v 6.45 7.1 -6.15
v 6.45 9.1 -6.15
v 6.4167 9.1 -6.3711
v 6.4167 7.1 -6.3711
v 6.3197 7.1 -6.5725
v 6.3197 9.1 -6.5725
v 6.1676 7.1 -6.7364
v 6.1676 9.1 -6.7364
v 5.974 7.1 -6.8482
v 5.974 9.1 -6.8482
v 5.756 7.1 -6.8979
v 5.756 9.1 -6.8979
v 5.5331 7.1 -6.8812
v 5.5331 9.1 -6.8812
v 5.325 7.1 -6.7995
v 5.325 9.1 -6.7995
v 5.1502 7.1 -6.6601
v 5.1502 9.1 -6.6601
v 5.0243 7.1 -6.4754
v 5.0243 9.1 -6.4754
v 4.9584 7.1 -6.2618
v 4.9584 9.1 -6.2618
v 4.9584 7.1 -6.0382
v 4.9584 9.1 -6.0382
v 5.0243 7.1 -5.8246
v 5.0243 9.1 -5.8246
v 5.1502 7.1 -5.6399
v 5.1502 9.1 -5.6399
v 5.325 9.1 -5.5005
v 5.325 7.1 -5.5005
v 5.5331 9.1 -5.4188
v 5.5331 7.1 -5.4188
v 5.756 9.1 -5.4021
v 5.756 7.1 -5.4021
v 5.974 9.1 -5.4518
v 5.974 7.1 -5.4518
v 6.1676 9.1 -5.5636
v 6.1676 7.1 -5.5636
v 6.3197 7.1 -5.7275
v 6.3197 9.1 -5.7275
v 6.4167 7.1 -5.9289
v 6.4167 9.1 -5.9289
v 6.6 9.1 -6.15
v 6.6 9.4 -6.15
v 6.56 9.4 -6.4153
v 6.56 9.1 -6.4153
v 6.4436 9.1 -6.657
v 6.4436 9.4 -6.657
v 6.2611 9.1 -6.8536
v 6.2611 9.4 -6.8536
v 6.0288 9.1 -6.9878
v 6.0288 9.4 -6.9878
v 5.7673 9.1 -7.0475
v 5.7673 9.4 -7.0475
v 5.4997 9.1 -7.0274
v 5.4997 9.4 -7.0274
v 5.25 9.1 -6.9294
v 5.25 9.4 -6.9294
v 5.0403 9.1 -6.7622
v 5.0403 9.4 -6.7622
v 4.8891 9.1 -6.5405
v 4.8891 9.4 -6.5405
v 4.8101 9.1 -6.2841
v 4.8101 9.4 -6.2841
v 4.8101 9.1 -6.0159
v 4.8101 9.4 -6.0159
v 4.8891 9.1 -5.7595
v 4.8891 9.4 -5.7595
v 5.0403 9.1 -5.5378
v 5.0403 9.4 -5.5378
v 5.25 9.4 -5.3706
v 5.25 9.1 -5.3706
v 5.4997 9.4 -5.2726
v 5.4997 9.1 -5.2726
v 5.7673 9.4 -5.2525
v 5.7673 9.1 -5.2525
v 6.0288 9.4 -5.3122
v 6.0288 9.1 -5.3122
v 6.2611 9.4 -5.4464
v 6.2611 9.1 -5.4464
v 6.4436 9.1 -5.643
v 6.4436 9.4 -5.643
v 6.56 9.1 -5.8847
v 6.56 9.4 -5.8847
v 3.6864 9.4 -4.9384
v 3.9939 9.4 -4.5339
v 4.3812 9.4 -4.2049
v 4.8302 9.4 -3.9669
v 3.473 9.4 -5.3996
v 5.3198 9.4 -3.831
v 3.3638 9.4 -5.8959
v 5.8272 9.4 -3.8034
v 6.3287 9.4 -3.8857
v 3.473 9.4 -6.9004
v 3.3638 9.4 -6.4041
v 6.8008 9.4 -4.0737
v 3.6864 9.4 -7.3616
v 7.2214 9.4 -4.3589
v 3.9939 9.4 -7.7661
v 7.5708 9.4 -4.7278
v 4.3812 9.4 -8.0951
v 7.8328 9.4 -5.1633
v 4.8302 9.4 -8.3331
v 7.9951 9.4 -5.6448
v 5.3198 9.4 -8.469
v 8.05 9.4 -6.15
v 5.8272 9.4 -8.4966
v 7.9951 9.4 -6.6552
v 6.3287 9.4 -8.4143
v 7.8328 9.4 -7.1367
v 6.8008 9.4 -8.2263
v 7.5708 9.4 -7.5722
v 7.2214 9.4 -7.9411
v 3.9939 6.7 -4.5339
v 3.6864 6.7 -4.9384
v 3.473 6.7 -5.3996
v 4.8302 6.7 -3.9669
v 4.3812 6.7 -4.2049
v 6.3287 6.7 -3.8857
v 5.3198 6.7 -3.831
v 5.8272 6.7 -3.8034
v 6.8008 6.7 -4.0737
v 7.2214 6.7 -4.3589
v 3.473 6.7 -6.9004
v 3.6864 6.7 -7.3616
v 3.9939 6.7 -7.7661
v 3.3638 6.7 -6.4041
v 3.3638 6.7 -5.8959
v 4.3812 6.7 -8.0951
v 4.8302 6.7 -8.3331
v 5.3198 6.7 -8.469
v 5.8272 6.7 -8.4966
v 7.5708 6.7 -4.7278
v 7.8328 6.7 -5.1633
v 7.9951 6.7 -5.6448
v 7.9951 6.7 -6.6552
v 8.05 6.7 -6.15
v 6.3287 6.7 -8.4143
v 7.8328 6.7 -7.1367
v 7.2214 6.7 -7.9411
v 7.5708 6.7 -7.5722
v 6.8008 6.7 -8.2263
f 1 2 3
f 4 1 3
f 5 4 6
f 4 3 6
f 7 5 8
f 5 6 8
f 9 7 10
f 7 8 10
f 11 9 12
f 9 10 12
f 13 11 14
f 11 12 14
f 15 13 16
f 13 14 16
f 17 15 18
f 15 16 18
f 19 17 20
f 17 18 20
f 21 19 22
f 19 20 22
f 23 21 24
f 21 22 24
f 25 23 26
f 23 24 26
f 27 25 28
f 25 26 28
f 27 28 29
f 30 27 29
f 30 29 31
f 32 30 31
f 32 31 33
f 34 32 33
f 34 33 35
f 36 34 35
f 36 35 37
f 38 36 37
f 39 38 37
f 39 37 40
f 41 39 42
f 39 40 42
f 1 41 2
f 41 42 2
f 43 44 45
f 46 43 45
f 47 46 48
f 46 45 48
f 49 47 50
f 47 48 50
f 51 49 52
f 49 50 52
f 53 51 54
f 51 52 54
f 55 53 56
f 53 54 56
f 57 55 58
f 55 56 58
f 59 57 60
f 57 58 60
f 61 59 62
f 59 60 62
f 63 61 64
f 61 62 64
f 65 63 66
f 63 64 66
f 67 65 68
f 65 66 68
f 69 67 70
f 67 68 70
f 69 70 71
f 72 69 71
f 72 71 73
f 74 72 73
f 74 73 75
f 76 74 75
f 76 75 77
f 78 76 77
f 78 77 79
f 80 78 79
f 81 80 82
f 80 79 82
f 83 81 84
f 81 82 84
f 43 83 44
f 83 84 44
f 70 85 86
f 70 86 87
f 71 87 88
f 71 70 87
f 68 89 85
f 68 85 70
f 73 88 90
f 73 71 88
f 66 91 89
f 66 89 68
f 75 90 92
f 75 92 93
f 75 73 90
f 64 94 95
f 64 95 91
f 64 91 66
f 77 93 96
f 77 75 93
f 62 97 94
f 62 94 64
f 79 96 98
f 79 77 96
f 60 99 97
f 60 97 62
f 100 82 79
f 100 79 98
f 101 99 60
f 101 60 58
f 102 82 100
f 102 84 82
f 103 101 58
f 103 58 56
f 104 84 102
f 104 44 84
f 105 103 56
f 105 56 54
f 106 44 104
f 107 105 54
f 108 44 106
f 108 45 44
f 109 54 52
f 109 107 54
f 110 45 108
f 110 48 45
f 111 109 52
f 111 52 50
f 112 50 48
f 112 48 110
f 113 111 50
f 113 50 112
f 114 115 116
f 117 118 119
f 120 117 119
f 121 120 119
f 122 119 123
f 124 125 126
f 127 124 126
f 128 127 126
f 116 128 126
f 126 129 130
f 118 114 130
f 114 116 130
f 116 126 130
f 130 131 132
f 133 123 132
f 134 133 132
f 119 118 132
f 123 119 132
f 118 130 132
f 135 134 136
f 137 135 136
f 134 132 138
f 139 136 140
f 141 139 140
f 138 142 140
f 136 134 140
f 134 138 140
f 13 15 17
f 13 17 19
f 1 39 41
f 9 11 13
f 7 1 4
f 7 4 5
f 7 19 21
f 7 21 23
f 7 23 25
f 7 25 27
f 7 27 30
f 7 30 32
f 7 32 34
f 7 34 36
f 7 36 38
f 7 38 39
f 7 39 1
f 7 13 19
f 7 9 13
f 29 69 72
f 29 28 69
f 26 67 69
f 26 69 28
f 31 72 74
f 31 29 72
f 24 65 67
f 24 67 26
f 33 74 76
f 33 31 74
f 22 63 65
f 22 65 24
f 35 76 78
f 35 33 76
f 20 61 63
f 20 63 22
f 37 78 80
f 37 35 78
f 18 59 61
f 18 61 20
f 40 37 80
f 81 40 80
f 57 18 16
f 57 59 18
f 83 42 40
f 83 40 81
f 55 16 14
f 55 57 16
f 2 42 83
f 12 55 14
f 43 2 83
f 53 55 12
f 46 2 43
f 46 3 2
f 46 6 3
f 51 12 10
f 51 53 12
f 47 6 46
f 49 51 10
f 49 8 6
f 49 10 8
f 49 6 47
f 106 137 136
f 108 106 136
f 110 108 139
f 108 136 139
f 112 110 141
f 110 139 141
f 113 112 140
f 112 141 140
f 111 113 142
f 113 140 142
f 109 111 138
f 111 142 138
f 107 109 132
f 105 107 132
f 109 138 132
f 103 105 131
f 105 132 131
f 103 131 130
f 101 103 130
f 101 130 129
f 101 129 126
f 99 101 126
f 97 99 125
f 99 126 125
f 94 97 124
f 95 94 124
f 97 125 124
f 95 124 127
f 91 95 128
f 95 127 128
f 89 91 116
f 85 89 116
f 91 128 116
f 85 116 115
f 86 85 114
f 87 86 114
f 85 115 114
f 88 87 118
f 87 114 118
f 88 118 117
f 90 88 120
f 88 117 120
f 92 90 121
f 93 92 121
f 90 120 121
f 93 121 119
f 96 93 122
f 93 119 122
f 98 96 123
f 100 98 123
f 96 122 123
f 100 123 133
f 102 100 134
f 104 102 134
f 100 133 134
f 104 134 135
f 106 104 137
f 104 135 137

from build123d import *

# Parameters (mm, degrees)
SKETCH7_BP_R         = 0.75
EXTRUSION7_CUT_DEPTH = 2
SKETCH6_BP_R         = 0.9
EXTRUSION6_CUT_DEPTH = 0.3
SKETCH5_BP_R         = 2.35
EXTRUSION5_DEPTH     = 2.7


with BuildPart() as extrusion7_cut:
    # Sketch7_bp → Extrusion7_Cut (new body)
    with BuildSketch(Plane(origin=(5.7, 9.1, -6.15), x_dir=(1, 0, 0), z_dir=(0, 1, 0))):
        Circle(SKETCH7_BP_R)
    extrude(amount=-EXTRUSION7_CUT_DEPTH)


with BuildPart() as extrusion6_cut:
    # Sketch6_bp → Extrusion6_Cut (new body)
    with BuildSketch(Plane(origin=(5.7, 9.4, -6.15), x_dir=(1, 0, 0), z_dir=(0, 1, 0))):
        Circle(SKETCH6_BP_R)
    extrude(amount=-EXTRUSION6_CUT_DEPTH)


with BuildPart() as extrusion7:
    # Sketch5_bp → Extrusion5 (new body)
    with BuildSketch(Plane(origin=(5.7, 6.7, -6.15), x_dir=(1, 0, 0), z_dir=(0, 1, 0))):
        Circle(SKETCH5_BP_R)
    extrude(amount=EXTRUSION5_DEPTH)

    # Extrusion6: cut Extrusion6_Cut
    add(extrusion6_cut.part, mode=Mode.SUBTRACT)

    # Extrusion7: cut Extrusion7_Cut
    add(extrusion7_cut.part, mode=Mode.SUBTRACT)


solid = extrusion7.part
